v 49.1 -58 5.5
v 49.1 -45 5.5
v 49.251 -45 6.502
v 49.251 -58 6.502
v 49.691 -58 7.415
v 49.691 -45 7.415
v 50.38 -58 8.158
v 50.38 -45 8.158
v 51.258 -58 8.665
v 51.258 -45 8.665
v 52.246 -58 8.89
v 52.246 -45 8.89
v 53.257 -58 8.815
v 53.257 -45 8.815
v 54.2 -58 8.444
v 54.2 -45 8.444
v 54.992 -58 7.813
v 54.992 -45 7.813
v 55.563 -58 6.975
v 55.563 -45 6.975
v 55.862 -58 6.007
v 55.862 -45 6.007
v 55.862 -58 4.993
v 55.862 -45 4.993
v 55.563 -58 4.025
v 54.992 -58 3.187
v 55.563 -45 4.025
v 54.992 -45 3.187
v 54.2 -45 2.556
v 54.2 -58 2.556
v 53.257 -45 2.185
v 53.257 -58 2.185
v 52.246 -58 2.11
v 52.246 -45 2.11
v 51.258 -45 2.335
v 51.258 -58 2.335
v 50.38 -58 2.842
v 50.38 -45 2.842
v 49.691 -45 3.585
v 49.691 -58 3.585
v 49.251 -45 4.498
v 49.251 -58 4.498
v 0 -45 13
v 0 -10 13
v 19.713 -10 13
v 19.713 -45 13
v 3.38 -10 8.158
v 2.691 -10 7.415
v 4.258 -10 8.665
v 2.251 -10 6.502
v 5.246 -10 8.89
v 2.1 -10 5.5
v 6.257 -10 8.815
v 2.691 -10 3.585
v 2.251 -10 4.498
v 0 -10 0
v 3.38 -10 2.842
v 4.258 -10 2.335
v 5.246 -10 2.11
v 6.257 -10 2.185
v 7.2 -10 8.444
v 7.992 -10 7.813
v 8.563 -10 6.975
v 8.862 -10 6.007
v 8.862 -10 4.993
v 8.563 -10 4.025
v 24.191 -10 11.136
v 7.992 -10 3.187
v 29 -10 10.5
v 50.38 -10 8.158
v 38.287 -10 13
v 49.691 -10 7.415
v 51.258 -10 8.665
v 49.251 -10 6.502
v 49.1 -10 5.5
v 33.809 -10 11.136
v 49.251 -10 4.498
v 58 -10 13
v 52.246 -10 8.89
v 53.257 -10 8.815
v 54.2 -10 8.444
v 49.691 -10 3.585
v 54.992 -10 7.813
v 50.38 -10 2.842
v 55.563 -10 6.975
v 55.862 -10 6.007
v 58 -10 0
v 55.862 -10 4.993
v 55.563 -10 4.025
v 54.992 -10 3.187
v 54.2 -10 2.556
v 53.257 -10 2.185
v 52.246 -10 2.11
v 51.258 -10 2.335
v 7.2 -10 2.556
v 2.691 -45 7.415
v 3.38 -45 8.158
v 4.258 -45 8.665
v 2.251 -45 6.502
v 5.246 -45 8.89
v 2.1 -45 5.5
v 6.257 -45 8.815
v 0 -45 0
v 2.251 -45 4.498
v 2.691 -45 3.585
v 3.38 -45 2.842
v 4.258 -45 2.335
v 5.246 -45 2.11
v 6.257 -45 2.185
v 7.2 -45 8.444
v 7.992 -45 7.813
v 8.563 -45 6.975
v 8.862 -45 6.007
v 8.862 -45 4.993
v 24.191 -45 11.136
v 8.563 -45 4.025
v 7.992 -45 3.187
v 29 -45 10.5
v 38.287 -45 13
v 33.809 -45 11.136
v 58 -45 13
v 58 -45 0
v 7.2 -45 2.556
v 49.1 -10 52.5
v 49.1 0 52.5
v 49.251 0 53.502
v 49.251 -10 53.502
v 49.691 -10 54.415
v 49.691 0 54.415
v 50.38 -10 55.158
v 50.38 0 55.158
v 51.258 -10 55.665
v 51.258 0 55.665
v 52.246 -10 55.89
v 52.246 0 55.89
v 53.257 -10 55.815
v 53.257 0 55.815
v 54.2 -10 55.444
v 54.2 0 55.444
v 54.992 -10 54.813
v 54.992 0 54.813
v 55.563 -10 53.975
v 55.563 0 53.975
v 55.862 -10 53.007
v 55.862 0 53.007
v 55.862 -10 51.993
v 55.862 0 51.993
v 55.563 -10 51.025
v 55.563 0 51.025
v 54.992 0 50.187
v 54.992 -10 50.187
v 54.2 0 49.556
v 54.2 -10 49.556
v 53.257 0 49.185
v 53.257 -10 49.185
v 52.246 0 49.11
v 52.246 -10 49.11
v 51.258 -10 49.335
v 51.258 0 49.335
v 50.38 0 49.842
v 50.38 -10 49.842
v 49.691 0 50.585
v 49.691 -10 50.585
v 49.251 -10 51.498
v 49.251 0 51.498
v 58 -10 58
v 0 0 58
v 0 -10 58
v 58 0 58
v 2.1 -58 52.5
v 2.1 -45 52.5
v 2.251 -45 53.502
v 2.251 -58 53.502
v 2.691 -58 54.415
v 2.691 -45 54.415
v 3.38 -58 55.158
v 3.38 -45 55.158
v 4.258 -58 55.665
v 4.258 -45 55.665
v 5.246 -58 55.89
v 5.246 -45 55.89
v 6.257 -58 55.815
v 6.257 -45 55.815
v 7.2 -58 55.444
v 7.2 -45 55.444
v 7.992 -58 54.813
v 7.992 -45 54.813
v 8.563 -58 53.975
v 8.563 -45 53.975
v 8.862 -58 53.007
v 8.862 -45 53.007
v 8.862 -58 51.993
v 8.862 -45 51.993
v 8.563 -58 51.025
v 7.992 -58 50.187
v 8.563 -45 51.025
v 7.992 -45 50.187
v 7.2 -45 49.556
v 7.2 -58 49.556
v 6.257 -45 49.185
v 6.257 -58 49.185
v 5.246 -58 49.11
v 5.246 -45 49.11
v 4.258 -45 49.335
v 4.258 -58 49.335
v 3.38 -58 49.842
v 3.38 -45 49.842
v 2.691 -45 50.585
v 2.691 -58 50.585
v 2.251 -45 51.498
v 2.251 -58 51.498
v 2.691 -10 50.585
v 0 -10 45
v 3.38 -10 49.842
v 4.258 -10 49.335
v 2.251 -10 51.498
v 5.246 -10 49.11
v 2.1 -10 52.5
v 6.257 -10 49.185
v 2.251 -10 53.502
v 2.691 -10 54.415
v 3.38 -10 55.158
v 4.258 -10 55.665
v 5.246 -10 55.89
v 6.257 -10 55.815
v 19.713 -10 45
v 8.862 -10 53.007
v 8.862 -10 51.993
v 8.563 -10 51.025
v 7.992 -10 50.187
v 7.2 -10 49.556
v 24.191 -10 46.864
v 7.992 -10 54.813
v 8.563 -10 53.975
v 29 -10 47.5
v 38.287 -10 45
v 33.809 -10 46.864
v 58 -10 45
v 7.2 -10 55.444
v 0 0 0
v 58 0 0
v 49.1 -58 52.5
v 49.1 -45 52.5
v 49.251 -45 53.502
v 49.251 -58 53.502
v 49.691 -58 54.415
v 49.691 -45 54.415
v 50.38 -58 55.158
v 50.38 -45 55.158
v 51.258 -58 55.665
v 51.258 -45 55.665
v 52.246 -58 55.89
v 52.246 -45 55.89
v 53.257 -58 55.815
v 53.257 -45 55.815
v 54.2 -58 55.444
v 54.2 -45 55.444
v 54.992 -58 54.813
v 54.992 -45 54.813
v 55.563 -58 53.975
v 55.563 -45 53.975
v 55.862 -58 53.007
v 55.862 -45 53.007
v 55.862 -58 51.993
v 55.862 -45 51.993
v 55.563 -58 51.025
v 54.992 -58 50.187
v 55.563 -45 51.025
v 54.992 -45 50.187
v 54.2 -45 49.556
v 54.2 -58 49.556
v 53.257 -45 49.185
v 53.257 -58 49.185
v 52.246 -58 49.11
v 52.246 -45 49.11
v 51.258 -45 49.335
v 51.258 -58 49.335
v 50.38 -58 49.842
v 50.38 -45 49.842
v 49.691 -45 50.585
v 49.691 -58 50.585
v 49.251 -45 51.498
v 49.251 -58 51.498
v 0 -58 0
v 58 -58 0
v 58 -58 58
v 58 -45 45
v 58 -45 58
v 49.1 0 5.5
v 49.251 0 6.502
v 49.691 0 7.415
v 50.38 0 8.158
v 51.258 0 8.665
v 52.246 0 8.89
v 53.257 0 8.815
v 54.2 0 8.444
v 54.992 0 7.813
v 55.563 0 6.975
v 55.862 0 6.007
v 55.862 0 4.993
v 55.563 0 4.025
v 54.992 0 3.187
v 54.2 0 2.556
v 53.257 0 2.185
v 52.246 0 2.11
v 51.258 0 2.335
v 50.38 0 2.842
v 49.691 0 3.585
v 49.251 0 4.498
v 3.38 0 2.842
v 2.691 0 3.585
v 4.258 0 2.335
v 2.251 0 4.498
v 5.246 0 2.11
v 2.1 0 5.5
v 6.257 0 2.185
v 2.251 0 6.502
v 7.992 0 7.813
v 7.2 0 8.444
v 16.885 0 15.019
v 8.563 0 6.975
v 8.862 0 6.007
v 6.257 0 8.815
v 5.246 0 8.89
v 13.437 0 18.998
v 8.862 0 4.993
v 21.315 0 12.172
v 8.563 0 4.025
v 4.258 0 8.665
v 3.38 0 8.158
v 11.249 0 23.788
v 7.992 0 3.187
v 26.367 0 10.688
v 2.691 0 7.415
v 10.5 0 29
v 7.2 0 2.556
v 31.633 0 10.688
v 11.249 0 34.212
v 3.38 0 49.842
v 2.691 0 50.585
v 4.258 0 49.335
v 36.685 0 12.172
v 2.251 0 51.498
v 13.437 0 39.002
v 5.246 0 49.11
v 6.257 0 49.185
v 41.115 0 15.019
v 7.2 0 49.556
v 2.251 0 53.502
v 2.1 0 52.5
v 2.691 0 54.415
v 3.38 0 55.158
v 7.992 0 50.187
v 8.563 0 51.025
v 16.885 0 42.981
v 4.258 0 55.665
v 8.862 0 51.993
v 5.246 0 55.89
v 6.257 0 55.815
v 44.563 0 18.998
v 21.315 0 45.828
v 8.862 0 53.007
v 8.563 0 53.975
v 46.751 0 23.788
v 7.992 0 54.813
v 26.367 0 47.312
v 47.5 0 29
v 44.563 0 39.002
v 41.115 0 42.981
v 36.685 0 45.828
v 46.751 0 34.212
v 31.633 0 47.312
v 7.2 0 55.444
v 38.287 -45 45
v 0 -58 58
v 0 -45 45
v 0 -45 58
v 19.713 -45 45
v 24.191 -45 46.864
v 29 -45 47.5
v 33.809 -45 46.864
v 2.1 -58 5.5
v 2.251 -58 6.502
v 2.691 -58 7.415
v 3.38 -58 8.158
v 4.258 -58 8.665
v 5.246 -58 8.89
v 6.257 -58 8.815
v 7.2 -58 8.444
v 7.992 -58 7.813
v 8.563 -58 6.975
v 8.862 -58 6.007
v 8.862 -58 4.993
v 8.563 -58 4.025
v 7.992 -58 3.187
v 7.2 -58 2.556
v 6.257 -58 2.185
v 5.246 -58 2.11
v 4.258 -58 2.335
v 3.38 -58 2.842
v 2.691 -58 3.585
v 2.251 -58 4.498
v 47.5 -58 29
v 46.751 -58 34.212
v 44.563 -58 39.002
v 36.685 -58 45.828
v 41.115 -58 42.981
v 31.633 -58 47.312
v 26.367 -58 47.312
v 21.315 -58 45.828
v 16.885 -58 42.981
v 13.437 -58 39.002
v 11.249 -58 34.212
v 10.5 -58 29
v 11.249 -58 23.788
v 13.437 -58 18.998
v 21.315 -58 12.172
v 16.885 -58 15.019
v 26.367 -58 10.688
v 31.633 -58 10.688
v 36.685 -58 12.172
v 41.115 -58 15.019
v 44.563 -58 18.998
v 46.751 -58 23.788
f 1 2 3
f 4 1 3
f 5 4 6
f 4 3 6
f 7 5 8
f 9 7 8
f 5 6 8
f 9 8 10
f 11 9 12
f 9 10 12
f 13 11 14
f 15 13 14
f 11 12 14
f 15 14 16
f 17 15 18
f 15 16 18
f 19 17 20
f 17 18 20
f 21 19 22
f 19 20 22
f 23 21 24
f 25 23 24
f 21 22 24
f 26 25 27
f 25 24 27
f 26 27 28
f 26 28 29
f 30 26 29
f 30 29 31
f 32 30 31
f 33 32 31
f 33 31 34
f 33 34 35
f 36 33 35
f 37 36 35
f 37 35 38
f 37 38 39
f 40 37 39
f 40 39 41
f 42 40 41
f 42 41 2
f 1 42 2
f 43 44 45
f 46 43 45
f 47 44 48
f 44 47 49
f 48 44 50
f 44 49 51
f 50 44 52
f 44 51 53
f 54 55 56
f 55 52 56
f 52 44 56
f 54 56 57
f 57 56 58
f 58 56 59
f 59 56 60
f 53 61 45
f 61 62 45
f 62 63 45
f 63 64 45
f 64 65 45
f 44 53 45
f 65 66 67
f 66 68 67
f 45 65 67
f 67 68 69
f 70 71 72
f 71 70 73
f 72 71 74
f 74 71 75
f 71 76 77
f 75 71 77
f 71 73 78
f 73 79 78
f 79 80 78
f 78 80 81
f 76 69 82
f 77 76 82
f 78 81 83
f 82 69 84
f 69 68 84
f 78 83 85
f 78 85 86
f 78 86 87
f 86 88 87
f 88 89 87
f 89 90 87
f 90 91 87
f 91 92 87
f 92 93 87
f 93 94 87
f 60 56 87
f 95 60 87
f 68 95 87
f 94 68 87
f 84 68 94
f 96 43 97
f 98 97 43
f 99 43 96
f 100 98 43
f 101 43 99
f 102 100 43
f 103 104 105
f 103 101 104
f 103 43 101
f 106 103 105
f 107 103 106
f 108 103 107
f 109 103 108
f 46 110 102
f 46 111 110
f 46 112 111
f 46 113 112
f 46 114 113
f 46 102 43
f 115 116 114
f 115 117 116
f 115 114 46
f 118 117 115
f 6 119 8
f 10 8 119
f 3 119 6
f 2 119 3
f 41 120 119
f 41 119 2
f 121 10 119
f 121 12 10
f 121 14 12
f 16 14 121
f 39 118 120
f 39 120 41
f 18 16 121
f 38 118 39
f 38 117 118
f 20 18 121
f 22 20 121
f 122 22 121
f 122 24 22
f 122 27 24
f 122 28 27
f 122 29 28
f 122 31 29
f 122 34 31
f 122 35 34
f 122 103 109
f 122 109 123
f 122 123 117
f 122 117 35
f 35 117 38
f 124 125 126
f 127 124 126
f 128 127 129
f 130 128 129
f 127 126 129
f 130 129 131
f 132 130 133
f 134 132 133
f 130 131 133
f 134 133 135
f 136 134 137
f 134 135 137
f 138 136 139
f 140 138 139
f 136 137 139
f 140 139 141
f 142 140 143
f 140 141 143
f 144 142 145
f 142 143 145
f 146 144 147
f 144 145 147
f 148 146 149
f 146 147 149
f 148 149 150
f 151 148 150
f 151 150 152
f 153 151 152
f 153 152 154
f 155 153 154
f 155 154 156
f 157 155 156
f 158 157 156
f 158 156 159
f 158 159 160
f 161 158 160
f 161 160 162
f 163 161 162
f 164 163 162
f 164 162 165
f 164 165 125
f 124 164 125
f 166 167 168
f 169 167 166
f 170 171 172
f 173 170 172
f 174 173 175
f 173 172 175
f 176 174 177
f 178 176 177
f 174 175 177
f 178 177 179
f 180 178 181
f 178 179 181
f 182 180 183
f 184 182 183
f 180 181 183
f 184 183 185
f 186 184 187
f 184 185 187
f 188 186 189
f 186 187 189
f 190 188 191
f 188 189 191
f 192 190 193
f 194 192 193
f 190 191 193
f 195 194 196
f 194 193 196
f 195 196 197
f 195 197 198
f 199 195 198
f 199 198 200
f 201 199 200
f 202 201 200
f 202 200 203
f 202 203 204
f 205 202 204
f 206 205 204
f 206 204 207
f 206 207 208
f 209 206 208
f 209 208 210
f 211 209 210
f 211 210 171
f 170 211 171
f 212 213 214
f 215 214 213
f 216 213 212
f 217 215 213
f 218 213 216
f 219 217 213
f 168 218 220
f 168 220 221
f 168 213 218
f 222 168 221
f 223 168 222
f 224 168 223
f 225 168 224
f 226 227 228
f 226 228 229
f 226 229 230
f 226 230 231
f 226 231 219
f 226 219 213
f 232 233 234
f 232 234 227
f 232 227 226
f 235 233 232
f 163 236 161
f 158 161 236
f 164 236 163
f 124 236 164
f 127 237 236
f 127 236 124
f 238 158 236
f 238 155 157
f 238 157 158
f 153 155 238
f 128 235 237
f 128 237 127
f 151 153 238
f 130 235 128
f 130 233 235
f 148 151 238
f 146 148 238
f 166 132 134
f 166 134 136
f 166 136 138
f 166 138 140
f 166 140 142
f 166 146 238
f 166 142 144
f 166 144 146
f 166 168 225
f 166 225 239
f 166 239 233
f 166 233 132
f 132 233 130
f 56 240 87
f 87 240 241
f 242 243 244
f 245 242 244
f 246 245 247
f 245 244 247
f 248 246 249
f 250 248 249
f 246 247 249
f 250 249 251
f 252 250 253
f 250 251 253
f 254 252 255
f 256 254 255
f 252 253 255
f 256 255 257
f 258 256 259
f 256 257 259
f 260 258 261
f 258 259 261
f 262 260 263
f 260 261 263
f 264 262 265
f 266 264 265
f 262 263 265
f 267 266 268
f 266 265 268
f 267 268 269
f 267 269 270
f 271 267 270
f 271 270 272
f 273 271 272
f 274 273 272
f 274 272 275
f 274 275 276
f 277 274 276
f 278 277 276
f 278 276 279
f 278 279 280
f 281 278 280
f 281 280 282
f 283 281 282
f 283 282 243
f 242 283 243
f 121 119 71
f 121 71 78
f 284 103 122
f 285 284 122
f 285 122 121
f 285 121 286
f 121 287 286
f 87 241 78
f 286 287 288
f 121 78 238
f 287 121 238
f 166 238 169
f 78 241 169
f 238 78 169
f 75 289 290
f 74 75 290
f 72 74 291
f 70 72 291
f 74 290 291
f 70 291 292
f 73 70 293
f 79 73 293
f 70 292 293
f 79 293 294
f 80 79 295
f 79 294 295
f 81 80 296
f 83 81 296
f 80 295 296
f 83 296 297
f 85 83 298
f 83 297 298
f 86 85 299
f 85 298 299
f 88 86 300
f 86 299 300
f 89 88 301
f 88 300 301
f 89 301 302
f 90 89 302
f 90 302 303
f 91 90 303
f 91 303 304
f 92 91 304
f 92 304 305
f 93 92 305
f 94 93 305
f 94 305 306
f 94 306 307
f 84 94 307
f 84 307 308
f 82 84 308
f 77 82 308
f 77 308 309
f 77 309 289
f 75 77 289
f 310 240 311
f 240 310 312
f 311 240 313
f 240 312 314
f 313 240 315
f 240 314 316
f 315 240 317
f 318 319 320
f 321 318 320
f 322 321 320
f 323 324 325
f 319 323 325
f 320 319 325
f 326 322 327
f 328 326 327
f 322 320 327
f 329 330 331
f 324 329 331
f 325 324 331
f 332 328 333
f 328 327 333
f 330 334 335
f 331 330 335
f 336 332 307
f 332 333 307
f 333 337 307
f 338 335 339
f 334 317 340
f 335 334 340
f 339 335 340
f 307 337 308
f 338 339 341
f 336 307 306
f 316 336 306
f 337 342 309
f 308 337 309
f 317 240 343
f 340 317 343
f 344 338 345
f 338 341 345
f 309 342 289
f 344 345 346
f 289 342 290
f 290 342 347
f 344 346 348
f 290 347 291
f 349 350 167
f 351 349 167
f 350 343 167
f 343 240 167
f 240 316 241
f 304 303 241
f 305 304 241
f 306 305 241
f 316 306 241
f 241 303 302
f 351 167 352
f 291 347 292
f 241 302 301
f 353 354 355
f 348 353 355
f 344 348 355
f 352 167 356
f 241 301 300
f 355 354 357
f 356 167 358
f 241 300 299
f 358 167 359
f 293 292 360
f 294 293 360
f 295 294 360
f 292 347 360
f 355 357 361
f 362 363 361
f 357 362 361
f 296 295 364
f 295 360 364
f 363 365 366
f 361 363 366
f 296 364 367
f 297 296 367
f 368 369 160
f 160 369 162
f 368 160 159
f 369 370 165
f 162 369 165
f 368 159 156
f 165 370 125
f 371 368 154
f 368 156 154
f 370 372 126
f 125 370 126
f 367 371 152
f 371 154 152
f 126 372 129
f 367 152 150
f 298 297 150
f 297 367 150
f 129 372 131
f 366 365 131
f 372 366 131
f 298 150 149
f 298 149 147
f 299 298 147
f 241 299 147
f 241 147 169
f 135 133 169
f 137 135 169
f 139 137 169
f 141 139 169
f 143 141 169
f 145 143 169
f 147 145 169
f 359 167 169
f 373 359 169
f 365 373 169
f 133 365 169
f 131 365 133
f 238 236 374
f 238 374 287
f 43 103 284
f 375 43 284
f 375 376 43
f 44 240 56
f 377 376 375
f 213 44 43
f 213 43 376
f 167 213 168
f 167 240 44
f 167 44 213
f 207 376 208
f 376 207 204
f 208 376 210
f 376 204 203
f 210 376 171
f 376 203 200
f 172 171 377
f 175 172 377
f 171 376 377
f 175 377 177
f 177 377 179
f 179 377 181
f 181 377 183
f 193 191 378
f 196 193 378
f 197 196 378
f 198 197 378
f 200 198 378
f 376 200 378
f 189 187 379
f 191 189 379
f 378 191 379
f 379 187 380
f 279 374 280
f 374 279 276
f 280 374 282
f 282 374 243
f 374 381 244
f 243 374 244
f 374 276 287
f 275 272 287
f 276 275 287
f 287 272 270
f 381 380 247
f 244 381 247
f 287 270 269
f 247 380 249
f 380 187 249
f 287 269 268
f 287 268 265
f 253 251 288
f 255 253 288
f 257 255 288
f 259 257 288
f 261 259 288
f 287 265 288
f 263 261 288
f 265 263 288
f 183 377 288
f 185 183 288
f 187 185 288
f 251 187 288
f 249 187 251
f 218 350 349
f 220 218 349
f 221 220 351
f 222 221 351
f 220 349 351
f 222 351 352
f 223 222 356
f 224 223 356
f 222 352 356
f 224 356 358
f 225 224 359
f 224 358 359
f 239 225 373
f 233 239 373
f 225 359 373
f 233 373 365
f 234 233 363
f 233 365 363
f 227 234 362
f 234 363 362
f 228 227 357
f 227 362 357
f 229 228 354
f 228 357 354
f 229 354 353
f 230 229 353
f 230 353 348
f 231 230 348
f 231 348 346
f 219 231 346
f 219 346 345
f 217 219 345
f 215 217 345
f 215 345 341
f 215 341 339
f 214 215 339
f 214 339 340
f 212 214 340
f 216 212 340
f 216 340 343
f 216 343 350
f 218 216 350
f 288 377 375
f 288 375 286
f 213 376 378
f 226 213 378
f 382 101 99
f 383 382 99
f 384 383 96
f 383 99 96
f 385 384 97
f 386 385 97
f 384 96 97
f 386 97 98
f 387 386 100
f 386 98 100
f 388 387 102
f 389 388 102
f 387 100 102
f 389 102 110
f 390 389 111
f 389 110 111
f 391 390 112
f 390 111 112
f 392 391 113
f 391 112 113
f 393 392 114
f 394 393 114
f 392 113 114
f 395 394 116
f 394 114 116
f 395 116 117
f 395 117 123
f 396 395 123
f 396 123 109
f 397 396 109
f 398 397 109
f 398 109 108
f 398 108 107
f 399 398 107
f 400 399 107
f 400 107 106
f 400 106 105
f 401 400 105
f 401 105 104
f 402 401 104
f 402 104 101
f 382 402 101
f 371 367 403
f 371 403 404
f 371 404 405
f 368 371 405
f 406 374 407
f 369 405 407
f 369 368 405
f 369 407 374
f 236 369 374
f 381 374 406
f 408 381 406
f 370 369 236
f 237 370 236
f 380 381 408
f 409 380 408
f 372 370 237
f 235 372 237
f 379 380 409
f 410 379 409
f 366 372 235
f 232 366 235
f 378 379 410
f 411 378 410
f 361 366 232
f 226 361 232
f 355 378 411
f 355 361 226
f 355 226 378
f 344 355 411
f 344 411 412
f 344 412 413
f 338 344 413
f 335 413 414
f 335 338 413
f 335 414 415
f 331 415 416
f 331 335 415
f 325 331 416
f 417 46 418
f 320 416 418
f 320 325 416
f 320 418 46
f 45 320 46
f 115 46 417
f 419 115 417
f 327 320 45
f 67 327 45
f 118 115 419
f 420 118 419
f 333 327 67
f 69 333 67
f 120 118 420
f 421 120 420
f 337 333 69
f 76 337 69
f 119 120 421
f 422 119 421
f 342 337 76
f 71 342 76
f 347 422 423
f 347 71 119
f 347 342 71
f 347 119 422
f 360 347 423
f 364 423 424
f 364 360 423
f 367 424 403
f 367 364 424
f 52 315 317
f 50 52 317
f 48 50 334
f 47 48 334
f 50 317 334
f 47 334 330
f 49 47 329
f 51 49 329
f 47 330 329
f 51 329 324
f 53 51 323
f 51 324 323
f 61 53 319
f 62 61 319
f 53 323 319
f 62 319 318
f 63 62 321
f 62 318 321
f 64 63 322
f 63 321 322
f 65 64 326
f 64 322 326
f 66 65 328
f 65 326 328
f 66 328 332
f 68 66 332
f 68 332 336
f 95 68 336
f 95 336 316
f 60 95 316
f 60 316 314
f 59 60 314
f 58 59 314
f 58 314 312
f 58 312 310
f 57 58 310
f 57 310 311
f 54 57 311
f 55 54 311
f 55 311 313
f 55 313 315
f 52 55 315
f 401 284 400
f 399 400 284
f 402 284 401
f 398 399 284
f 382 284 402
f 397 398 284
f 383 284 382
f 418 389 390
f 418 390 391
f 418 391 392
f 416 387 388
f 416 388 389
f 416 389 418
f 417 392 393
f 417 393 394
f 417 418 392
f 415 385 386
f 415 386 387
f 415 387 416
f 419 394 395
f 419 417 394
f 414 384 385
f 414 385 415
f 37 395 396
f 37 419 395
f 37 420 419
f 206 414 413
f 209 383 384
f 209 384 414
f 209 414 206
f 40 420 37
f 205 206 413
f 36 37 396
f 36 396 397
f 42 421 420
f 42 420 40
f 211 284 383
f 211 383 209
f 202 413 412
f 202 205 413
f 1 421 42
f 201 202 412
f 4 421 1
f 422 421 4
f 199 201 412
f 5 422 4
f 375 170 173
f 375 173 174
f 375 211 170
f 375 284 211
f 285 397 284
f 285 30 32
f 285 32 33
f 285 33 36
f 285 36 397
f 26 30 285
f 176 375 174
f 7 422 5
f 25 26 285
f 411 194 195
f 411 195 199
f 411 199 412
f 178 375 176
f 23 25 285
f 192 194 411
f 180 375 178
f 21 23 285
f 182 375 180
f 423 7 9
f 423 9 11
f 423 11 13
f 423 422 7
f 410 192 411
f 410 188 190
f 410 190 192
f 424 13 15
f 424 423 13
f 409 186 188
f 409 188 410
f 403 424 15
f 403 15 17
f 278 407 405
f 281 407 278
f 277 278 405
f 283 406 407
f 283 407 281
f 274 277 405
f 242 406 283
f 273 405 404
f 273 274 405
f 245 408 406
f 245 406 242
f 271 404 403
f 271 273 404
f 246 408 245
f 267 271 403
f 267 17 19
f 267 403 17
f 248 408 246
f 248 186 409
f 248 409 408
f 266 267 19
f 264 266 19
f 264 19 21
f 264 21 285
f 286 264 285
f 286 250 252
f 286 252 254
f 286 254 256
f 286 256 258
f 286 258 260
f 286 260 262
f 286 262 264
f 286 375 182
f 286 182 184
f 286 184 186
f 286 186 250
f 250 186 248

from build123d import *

# Parameters (mm, degrees)
F0_W     = 58
F0_H     = 58
F0_R     = 18.5
F1_DEPTH = 58
F2_W     = 58
F2_H     = 35
F3_DEPTH = 13
F4_W     = 58
F4_H     = 35
F5_DEPTH = 13
F7_D     = 6.8


with BuildPart() as f1:
    # F0 (on Front) → F1 (new body)
    with BuildSketch(Plane.XZ):
        with Locations((29, 29)):
            Rectangle(F0_W, F0_H)
        with Locations((29, 29)):
            Circle(F0_R, mode=Mode.SUBTRACT)
    extrude(amount=F1_DEPTH)

    # F2 (on face) → F3 (cut)
    with BuildSketch(Plane.XY.offset(58)):
        with Locations((29, -27.5)):
            Rectangle(F2_W, F2_H)
    extrude(amount=-F3_DEPTH, mode=Mode.SUBTRACT)

    # F4 (on face) → F5 (cut)
    with BuildSketch(Plane(origin=(0, 0, 0), x_dir=(1, 0, 0), z_dir=(0, 0, -1))):
        with Locations((29, 27.5)):
            Rectangle(F4_W, F4_H)
    extrude(amount=-F5_DEPTH, mode=Mode.SUBTRACT)

    # F7 (through all)
    with Locations(Plane.XZ.offset(58)):
        with Locations((5.5, 52.5), (52.5, 52.5), (5.5, 5.5), (52.5, 5.5)):
            Hole(F7_D / 2)


solid = f1.part
